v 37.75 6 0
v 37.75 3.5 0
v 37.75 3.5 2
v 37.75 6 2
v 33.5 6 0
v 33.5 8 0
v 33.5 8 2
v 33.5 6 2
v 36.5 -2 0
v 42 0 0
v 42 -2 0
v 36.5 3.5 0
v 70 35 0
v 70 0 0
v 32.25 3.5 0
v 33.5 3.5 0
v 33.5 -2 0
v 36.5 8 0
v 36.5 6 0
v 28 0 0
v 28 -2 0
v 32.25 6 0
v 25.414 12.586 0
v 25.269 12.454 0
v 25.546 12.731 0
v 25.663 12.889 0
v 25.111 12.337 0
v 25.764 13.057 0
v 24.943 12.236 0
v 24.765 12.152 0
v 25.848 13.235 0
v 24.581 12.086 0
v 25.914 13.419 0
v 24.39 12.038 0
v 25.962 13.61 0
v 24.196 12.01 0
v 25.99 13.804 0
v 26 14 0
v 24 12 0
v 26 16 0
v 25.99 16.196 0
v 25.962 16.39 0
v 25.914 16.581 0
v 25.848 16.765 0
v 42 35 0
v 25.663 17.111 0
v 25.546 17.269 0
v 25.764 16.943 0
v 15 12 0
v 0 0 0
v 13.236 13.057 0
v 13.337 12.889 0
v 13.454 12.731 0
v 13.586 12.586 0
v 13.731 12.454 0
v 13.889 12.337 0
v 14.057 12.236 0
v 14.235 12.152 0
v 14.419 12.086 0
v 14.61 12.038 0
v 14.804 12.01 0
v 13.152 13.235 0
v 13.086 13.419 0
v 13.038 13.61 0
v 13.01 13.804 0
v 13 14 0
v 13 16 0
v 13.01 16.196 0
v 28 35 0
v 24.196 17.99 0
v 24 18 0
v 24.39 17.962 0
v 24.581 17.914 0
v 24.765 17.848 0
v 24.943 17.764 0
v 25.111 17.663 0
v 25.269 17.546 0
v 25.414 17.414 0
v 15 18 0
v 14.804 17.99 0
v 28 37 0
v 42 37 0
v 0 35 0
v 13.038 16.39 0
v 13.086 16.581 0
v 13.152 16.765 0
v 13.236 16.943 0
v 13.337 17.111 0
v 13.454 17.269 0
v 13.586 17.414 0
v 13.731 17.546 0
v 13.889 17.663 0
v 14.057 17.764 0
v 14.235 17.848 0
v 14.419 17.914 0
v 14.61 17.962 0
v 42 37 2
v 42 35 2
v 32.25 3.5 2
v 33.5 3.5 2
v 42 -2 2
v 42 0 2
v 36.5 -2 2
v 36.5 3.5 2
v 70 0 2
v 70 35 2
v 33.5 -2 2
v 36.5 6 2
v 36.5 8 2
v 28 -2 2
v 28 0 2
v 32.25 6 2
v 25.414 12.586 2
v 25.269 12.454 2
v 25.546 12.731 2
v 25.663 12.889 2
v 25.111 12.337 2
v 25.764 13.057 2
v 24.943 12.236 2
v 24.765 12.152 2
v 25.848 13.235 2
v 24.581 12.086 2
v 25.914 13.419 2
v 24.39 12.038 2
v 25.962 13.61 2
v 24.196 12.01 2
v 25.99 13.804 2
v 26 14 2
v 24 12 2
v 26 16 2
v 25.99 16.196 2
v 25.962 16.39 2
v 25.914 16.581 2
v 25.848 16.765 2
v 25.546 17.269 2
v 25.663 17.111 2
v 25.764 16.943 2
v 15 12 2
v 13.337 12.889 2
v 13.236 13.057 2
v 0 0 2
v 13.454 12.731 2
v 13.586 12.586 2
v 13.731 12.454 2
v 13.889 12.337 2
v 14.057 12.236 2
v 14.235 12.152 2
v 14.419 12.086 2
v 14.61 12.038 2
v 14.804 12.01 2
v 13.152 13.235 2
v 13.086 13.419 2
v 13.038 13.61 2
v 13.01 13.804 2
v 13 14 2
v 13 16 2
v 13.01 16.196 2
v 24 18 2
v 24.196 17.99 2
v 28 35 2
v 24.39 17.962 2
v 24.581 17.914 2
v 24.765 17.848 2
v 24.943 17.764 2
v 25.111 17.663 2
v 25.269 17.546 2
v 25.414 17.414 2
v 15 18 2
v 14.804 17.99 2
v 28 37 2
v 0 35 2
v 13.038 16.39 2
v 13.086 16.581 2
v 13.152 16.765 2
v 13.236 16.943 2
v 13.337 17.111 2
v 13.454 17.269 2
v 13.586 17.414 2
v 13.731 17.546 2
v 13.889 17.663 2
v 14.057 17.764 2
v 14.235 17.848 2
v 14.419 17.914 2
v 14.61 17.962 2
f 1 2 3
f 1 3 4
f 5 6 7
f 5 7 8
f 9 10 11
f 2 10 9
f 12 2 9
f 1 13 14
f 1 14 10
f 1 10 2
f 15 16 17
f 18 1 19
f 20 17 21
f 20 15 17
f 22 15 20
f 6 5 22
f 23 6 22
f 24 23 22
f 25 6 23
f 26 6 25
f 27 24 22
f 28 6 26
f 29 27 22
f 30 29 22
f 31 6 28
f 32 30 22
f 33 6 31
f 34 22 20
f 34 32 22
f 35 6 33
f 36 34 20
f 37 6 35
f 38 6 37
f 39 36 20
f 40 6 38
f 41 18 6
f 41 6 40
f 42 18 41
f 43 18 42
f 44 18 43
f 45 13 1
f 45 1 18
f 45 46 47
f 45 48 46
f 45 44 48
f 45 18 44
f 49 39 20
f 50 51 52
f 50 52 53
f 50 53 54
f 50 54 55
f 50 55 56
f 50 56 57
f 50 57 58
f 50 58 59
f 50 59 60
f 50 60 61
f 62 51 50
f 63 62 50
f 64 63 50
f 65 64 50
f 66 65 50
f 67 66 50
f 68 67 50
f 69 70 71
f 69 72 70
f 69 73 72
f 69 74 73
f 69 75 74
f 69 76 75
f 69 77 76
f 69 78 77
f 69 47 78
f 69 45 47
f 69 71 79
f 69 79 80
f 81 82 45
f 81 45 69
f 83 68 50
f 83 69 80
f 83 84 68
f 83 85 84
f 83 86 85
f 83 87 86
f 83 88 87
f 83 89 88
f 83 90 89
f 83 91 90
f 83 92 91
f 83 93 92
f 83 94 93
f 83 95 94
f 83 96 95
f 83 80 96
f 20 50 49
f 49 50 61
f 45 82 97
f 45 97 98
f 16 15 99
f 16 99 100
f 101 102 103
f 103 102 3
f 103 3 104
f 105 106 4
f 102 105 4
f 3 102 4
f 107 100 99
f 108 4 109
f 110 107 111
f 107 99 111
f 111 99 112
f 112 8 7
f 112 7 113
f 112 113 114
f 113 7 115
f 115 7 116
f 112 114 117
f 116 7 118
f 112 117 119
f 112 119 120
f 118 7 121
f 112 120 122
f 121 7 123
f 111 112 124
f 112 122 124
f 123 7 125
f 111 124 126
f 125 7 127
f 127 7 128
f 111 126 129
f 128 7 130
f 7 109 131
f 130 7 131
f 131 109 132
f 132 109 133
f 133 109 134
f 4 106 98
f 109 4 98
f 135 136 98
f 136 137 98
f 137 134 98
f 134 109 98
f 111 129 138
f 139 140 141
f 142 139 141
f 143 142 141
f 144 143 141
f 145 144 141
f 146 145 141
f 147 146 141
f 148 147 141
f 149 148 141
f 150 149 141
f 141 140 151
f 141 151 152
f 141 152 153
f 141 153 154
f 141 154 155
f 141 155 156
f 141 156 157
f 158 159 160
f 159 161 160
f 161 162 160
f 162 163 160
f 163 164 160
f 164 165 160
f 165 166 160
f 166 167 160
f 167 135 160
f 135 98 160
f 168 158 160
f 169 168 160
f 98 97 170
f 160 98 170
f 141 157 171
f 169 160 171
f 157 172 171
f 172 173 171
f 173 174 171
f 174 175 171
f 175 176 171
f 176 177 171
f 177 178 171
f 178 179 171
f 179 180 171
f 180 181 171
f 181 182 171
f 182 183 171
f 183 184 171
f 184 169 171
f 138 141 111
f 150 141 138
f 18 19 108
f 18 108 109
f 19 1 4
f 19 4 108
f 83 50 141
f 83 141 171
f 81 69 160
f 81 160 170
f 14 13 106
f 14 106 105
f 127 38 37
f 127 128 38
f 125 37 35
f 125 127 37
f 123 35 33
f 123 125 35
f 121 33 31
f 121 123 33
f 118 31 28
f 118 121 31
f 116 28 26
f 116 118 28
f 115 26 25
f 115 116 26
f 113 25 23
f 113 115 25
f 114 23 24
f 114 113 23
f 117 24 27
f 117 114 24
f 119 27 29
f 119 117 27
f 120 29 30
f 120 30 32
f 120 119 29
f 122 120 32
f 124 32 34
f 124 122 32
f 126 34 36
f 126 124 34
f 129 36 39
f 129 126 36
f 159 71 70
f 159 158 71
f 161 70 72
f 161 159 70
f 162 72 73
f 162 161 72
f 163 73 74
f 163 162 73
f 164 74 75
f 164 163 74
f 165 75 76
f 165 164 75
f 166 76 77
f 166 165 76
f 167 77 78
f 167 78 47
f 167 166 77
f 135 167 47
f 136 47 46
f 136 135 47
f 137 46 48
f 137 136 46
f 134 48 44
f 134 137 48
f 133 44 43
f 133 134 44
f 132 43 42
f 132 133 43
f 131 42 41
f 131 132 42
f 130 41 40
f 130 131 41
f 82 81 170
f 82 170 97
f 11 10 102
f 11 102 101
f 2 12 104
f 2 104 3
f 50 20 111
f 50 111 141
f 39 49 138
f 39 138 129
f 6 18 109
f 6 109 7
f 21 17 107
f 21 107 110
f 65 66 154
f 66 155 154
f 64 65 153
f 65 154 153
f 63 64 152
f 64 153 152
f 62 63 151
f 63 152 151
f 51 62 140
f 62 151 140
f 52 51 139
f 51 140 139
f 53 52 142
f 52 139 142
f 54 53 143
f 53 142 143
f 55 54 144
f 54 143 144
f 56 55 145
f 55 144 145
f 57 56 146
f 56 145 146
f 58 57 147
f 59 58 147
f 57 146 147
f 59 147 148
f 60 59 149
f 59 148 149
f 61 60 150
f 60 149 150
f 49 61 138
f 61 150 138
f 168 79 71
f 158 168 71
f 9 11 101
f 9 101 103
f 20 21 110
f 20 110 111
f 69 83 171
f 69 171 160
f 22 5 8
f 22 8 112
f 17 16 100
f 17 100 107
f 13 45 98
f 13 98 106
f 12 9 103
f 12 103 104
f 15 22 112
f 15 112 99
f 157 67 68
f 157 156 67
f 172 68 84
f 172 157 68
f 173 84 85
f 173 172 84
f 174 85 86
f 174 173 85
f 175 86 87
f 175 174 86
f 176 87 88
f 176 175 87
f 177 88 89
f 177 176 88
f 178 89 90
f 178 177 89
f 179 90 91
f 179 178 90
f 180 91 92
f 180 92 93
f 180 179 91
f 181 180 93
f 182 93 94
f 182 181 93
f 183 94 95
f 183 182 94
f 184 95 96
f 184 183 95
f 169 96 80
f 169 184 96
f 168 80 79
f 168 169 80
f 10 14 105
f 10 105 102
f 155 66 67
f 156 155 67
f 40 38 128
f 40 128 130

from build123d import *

# Parameters (mm, degrees)
SKETCH1_W                   = 13
SKETCH1_H                   = 6
MAIN_SLIDER_SIDE_UP_DEPTH   = 2
SLIDER_SIDE_UP_CONTOURING_R = 2


with BuildPart() as part:
    # Sketch1 → Main Slider Side Up (new body)
    with BuildSketch(Plane.XY):
        Polygon((42, 35), (70, 35), (70, 0), (42, 0), (42, -2), (36.5, -2), (36.5, 3.5), (37.75, 3.5), (37.75, 6), (36.5, 6), (36.5, 8), (33.5, 8), (33.5, 6), (32.25, 6), (32.25, 3.5), (33.5, 3.5), (33.5, -2), (28, -2), (28, 0), (0, 0), (0, 35), (28, 35), (28, 37), (42, 37), align=None)
        with Locations((19.5, 15)):
            Rectangle(SKETCH1_W, SKETCH1_H, mode=Mode.SUBTRACT)
    extrude(amount=MAIN_SLIDER_SIDE_UP_DEPTH)

    # Slider Side Up Contouring
    slider_side_up_contouring_edges = [part.edges().sort_by_distance(p)[0] for p in [
        (26, 12, 1),
        (26, 18, 1),
        (13, 18, 1),
        (13, 12, 1),
    ]]
    fillet(slider_side_up_contouring_edges, radius=SLIDER_SIDE_UP_CONTOURING_R)


solid = part.part
